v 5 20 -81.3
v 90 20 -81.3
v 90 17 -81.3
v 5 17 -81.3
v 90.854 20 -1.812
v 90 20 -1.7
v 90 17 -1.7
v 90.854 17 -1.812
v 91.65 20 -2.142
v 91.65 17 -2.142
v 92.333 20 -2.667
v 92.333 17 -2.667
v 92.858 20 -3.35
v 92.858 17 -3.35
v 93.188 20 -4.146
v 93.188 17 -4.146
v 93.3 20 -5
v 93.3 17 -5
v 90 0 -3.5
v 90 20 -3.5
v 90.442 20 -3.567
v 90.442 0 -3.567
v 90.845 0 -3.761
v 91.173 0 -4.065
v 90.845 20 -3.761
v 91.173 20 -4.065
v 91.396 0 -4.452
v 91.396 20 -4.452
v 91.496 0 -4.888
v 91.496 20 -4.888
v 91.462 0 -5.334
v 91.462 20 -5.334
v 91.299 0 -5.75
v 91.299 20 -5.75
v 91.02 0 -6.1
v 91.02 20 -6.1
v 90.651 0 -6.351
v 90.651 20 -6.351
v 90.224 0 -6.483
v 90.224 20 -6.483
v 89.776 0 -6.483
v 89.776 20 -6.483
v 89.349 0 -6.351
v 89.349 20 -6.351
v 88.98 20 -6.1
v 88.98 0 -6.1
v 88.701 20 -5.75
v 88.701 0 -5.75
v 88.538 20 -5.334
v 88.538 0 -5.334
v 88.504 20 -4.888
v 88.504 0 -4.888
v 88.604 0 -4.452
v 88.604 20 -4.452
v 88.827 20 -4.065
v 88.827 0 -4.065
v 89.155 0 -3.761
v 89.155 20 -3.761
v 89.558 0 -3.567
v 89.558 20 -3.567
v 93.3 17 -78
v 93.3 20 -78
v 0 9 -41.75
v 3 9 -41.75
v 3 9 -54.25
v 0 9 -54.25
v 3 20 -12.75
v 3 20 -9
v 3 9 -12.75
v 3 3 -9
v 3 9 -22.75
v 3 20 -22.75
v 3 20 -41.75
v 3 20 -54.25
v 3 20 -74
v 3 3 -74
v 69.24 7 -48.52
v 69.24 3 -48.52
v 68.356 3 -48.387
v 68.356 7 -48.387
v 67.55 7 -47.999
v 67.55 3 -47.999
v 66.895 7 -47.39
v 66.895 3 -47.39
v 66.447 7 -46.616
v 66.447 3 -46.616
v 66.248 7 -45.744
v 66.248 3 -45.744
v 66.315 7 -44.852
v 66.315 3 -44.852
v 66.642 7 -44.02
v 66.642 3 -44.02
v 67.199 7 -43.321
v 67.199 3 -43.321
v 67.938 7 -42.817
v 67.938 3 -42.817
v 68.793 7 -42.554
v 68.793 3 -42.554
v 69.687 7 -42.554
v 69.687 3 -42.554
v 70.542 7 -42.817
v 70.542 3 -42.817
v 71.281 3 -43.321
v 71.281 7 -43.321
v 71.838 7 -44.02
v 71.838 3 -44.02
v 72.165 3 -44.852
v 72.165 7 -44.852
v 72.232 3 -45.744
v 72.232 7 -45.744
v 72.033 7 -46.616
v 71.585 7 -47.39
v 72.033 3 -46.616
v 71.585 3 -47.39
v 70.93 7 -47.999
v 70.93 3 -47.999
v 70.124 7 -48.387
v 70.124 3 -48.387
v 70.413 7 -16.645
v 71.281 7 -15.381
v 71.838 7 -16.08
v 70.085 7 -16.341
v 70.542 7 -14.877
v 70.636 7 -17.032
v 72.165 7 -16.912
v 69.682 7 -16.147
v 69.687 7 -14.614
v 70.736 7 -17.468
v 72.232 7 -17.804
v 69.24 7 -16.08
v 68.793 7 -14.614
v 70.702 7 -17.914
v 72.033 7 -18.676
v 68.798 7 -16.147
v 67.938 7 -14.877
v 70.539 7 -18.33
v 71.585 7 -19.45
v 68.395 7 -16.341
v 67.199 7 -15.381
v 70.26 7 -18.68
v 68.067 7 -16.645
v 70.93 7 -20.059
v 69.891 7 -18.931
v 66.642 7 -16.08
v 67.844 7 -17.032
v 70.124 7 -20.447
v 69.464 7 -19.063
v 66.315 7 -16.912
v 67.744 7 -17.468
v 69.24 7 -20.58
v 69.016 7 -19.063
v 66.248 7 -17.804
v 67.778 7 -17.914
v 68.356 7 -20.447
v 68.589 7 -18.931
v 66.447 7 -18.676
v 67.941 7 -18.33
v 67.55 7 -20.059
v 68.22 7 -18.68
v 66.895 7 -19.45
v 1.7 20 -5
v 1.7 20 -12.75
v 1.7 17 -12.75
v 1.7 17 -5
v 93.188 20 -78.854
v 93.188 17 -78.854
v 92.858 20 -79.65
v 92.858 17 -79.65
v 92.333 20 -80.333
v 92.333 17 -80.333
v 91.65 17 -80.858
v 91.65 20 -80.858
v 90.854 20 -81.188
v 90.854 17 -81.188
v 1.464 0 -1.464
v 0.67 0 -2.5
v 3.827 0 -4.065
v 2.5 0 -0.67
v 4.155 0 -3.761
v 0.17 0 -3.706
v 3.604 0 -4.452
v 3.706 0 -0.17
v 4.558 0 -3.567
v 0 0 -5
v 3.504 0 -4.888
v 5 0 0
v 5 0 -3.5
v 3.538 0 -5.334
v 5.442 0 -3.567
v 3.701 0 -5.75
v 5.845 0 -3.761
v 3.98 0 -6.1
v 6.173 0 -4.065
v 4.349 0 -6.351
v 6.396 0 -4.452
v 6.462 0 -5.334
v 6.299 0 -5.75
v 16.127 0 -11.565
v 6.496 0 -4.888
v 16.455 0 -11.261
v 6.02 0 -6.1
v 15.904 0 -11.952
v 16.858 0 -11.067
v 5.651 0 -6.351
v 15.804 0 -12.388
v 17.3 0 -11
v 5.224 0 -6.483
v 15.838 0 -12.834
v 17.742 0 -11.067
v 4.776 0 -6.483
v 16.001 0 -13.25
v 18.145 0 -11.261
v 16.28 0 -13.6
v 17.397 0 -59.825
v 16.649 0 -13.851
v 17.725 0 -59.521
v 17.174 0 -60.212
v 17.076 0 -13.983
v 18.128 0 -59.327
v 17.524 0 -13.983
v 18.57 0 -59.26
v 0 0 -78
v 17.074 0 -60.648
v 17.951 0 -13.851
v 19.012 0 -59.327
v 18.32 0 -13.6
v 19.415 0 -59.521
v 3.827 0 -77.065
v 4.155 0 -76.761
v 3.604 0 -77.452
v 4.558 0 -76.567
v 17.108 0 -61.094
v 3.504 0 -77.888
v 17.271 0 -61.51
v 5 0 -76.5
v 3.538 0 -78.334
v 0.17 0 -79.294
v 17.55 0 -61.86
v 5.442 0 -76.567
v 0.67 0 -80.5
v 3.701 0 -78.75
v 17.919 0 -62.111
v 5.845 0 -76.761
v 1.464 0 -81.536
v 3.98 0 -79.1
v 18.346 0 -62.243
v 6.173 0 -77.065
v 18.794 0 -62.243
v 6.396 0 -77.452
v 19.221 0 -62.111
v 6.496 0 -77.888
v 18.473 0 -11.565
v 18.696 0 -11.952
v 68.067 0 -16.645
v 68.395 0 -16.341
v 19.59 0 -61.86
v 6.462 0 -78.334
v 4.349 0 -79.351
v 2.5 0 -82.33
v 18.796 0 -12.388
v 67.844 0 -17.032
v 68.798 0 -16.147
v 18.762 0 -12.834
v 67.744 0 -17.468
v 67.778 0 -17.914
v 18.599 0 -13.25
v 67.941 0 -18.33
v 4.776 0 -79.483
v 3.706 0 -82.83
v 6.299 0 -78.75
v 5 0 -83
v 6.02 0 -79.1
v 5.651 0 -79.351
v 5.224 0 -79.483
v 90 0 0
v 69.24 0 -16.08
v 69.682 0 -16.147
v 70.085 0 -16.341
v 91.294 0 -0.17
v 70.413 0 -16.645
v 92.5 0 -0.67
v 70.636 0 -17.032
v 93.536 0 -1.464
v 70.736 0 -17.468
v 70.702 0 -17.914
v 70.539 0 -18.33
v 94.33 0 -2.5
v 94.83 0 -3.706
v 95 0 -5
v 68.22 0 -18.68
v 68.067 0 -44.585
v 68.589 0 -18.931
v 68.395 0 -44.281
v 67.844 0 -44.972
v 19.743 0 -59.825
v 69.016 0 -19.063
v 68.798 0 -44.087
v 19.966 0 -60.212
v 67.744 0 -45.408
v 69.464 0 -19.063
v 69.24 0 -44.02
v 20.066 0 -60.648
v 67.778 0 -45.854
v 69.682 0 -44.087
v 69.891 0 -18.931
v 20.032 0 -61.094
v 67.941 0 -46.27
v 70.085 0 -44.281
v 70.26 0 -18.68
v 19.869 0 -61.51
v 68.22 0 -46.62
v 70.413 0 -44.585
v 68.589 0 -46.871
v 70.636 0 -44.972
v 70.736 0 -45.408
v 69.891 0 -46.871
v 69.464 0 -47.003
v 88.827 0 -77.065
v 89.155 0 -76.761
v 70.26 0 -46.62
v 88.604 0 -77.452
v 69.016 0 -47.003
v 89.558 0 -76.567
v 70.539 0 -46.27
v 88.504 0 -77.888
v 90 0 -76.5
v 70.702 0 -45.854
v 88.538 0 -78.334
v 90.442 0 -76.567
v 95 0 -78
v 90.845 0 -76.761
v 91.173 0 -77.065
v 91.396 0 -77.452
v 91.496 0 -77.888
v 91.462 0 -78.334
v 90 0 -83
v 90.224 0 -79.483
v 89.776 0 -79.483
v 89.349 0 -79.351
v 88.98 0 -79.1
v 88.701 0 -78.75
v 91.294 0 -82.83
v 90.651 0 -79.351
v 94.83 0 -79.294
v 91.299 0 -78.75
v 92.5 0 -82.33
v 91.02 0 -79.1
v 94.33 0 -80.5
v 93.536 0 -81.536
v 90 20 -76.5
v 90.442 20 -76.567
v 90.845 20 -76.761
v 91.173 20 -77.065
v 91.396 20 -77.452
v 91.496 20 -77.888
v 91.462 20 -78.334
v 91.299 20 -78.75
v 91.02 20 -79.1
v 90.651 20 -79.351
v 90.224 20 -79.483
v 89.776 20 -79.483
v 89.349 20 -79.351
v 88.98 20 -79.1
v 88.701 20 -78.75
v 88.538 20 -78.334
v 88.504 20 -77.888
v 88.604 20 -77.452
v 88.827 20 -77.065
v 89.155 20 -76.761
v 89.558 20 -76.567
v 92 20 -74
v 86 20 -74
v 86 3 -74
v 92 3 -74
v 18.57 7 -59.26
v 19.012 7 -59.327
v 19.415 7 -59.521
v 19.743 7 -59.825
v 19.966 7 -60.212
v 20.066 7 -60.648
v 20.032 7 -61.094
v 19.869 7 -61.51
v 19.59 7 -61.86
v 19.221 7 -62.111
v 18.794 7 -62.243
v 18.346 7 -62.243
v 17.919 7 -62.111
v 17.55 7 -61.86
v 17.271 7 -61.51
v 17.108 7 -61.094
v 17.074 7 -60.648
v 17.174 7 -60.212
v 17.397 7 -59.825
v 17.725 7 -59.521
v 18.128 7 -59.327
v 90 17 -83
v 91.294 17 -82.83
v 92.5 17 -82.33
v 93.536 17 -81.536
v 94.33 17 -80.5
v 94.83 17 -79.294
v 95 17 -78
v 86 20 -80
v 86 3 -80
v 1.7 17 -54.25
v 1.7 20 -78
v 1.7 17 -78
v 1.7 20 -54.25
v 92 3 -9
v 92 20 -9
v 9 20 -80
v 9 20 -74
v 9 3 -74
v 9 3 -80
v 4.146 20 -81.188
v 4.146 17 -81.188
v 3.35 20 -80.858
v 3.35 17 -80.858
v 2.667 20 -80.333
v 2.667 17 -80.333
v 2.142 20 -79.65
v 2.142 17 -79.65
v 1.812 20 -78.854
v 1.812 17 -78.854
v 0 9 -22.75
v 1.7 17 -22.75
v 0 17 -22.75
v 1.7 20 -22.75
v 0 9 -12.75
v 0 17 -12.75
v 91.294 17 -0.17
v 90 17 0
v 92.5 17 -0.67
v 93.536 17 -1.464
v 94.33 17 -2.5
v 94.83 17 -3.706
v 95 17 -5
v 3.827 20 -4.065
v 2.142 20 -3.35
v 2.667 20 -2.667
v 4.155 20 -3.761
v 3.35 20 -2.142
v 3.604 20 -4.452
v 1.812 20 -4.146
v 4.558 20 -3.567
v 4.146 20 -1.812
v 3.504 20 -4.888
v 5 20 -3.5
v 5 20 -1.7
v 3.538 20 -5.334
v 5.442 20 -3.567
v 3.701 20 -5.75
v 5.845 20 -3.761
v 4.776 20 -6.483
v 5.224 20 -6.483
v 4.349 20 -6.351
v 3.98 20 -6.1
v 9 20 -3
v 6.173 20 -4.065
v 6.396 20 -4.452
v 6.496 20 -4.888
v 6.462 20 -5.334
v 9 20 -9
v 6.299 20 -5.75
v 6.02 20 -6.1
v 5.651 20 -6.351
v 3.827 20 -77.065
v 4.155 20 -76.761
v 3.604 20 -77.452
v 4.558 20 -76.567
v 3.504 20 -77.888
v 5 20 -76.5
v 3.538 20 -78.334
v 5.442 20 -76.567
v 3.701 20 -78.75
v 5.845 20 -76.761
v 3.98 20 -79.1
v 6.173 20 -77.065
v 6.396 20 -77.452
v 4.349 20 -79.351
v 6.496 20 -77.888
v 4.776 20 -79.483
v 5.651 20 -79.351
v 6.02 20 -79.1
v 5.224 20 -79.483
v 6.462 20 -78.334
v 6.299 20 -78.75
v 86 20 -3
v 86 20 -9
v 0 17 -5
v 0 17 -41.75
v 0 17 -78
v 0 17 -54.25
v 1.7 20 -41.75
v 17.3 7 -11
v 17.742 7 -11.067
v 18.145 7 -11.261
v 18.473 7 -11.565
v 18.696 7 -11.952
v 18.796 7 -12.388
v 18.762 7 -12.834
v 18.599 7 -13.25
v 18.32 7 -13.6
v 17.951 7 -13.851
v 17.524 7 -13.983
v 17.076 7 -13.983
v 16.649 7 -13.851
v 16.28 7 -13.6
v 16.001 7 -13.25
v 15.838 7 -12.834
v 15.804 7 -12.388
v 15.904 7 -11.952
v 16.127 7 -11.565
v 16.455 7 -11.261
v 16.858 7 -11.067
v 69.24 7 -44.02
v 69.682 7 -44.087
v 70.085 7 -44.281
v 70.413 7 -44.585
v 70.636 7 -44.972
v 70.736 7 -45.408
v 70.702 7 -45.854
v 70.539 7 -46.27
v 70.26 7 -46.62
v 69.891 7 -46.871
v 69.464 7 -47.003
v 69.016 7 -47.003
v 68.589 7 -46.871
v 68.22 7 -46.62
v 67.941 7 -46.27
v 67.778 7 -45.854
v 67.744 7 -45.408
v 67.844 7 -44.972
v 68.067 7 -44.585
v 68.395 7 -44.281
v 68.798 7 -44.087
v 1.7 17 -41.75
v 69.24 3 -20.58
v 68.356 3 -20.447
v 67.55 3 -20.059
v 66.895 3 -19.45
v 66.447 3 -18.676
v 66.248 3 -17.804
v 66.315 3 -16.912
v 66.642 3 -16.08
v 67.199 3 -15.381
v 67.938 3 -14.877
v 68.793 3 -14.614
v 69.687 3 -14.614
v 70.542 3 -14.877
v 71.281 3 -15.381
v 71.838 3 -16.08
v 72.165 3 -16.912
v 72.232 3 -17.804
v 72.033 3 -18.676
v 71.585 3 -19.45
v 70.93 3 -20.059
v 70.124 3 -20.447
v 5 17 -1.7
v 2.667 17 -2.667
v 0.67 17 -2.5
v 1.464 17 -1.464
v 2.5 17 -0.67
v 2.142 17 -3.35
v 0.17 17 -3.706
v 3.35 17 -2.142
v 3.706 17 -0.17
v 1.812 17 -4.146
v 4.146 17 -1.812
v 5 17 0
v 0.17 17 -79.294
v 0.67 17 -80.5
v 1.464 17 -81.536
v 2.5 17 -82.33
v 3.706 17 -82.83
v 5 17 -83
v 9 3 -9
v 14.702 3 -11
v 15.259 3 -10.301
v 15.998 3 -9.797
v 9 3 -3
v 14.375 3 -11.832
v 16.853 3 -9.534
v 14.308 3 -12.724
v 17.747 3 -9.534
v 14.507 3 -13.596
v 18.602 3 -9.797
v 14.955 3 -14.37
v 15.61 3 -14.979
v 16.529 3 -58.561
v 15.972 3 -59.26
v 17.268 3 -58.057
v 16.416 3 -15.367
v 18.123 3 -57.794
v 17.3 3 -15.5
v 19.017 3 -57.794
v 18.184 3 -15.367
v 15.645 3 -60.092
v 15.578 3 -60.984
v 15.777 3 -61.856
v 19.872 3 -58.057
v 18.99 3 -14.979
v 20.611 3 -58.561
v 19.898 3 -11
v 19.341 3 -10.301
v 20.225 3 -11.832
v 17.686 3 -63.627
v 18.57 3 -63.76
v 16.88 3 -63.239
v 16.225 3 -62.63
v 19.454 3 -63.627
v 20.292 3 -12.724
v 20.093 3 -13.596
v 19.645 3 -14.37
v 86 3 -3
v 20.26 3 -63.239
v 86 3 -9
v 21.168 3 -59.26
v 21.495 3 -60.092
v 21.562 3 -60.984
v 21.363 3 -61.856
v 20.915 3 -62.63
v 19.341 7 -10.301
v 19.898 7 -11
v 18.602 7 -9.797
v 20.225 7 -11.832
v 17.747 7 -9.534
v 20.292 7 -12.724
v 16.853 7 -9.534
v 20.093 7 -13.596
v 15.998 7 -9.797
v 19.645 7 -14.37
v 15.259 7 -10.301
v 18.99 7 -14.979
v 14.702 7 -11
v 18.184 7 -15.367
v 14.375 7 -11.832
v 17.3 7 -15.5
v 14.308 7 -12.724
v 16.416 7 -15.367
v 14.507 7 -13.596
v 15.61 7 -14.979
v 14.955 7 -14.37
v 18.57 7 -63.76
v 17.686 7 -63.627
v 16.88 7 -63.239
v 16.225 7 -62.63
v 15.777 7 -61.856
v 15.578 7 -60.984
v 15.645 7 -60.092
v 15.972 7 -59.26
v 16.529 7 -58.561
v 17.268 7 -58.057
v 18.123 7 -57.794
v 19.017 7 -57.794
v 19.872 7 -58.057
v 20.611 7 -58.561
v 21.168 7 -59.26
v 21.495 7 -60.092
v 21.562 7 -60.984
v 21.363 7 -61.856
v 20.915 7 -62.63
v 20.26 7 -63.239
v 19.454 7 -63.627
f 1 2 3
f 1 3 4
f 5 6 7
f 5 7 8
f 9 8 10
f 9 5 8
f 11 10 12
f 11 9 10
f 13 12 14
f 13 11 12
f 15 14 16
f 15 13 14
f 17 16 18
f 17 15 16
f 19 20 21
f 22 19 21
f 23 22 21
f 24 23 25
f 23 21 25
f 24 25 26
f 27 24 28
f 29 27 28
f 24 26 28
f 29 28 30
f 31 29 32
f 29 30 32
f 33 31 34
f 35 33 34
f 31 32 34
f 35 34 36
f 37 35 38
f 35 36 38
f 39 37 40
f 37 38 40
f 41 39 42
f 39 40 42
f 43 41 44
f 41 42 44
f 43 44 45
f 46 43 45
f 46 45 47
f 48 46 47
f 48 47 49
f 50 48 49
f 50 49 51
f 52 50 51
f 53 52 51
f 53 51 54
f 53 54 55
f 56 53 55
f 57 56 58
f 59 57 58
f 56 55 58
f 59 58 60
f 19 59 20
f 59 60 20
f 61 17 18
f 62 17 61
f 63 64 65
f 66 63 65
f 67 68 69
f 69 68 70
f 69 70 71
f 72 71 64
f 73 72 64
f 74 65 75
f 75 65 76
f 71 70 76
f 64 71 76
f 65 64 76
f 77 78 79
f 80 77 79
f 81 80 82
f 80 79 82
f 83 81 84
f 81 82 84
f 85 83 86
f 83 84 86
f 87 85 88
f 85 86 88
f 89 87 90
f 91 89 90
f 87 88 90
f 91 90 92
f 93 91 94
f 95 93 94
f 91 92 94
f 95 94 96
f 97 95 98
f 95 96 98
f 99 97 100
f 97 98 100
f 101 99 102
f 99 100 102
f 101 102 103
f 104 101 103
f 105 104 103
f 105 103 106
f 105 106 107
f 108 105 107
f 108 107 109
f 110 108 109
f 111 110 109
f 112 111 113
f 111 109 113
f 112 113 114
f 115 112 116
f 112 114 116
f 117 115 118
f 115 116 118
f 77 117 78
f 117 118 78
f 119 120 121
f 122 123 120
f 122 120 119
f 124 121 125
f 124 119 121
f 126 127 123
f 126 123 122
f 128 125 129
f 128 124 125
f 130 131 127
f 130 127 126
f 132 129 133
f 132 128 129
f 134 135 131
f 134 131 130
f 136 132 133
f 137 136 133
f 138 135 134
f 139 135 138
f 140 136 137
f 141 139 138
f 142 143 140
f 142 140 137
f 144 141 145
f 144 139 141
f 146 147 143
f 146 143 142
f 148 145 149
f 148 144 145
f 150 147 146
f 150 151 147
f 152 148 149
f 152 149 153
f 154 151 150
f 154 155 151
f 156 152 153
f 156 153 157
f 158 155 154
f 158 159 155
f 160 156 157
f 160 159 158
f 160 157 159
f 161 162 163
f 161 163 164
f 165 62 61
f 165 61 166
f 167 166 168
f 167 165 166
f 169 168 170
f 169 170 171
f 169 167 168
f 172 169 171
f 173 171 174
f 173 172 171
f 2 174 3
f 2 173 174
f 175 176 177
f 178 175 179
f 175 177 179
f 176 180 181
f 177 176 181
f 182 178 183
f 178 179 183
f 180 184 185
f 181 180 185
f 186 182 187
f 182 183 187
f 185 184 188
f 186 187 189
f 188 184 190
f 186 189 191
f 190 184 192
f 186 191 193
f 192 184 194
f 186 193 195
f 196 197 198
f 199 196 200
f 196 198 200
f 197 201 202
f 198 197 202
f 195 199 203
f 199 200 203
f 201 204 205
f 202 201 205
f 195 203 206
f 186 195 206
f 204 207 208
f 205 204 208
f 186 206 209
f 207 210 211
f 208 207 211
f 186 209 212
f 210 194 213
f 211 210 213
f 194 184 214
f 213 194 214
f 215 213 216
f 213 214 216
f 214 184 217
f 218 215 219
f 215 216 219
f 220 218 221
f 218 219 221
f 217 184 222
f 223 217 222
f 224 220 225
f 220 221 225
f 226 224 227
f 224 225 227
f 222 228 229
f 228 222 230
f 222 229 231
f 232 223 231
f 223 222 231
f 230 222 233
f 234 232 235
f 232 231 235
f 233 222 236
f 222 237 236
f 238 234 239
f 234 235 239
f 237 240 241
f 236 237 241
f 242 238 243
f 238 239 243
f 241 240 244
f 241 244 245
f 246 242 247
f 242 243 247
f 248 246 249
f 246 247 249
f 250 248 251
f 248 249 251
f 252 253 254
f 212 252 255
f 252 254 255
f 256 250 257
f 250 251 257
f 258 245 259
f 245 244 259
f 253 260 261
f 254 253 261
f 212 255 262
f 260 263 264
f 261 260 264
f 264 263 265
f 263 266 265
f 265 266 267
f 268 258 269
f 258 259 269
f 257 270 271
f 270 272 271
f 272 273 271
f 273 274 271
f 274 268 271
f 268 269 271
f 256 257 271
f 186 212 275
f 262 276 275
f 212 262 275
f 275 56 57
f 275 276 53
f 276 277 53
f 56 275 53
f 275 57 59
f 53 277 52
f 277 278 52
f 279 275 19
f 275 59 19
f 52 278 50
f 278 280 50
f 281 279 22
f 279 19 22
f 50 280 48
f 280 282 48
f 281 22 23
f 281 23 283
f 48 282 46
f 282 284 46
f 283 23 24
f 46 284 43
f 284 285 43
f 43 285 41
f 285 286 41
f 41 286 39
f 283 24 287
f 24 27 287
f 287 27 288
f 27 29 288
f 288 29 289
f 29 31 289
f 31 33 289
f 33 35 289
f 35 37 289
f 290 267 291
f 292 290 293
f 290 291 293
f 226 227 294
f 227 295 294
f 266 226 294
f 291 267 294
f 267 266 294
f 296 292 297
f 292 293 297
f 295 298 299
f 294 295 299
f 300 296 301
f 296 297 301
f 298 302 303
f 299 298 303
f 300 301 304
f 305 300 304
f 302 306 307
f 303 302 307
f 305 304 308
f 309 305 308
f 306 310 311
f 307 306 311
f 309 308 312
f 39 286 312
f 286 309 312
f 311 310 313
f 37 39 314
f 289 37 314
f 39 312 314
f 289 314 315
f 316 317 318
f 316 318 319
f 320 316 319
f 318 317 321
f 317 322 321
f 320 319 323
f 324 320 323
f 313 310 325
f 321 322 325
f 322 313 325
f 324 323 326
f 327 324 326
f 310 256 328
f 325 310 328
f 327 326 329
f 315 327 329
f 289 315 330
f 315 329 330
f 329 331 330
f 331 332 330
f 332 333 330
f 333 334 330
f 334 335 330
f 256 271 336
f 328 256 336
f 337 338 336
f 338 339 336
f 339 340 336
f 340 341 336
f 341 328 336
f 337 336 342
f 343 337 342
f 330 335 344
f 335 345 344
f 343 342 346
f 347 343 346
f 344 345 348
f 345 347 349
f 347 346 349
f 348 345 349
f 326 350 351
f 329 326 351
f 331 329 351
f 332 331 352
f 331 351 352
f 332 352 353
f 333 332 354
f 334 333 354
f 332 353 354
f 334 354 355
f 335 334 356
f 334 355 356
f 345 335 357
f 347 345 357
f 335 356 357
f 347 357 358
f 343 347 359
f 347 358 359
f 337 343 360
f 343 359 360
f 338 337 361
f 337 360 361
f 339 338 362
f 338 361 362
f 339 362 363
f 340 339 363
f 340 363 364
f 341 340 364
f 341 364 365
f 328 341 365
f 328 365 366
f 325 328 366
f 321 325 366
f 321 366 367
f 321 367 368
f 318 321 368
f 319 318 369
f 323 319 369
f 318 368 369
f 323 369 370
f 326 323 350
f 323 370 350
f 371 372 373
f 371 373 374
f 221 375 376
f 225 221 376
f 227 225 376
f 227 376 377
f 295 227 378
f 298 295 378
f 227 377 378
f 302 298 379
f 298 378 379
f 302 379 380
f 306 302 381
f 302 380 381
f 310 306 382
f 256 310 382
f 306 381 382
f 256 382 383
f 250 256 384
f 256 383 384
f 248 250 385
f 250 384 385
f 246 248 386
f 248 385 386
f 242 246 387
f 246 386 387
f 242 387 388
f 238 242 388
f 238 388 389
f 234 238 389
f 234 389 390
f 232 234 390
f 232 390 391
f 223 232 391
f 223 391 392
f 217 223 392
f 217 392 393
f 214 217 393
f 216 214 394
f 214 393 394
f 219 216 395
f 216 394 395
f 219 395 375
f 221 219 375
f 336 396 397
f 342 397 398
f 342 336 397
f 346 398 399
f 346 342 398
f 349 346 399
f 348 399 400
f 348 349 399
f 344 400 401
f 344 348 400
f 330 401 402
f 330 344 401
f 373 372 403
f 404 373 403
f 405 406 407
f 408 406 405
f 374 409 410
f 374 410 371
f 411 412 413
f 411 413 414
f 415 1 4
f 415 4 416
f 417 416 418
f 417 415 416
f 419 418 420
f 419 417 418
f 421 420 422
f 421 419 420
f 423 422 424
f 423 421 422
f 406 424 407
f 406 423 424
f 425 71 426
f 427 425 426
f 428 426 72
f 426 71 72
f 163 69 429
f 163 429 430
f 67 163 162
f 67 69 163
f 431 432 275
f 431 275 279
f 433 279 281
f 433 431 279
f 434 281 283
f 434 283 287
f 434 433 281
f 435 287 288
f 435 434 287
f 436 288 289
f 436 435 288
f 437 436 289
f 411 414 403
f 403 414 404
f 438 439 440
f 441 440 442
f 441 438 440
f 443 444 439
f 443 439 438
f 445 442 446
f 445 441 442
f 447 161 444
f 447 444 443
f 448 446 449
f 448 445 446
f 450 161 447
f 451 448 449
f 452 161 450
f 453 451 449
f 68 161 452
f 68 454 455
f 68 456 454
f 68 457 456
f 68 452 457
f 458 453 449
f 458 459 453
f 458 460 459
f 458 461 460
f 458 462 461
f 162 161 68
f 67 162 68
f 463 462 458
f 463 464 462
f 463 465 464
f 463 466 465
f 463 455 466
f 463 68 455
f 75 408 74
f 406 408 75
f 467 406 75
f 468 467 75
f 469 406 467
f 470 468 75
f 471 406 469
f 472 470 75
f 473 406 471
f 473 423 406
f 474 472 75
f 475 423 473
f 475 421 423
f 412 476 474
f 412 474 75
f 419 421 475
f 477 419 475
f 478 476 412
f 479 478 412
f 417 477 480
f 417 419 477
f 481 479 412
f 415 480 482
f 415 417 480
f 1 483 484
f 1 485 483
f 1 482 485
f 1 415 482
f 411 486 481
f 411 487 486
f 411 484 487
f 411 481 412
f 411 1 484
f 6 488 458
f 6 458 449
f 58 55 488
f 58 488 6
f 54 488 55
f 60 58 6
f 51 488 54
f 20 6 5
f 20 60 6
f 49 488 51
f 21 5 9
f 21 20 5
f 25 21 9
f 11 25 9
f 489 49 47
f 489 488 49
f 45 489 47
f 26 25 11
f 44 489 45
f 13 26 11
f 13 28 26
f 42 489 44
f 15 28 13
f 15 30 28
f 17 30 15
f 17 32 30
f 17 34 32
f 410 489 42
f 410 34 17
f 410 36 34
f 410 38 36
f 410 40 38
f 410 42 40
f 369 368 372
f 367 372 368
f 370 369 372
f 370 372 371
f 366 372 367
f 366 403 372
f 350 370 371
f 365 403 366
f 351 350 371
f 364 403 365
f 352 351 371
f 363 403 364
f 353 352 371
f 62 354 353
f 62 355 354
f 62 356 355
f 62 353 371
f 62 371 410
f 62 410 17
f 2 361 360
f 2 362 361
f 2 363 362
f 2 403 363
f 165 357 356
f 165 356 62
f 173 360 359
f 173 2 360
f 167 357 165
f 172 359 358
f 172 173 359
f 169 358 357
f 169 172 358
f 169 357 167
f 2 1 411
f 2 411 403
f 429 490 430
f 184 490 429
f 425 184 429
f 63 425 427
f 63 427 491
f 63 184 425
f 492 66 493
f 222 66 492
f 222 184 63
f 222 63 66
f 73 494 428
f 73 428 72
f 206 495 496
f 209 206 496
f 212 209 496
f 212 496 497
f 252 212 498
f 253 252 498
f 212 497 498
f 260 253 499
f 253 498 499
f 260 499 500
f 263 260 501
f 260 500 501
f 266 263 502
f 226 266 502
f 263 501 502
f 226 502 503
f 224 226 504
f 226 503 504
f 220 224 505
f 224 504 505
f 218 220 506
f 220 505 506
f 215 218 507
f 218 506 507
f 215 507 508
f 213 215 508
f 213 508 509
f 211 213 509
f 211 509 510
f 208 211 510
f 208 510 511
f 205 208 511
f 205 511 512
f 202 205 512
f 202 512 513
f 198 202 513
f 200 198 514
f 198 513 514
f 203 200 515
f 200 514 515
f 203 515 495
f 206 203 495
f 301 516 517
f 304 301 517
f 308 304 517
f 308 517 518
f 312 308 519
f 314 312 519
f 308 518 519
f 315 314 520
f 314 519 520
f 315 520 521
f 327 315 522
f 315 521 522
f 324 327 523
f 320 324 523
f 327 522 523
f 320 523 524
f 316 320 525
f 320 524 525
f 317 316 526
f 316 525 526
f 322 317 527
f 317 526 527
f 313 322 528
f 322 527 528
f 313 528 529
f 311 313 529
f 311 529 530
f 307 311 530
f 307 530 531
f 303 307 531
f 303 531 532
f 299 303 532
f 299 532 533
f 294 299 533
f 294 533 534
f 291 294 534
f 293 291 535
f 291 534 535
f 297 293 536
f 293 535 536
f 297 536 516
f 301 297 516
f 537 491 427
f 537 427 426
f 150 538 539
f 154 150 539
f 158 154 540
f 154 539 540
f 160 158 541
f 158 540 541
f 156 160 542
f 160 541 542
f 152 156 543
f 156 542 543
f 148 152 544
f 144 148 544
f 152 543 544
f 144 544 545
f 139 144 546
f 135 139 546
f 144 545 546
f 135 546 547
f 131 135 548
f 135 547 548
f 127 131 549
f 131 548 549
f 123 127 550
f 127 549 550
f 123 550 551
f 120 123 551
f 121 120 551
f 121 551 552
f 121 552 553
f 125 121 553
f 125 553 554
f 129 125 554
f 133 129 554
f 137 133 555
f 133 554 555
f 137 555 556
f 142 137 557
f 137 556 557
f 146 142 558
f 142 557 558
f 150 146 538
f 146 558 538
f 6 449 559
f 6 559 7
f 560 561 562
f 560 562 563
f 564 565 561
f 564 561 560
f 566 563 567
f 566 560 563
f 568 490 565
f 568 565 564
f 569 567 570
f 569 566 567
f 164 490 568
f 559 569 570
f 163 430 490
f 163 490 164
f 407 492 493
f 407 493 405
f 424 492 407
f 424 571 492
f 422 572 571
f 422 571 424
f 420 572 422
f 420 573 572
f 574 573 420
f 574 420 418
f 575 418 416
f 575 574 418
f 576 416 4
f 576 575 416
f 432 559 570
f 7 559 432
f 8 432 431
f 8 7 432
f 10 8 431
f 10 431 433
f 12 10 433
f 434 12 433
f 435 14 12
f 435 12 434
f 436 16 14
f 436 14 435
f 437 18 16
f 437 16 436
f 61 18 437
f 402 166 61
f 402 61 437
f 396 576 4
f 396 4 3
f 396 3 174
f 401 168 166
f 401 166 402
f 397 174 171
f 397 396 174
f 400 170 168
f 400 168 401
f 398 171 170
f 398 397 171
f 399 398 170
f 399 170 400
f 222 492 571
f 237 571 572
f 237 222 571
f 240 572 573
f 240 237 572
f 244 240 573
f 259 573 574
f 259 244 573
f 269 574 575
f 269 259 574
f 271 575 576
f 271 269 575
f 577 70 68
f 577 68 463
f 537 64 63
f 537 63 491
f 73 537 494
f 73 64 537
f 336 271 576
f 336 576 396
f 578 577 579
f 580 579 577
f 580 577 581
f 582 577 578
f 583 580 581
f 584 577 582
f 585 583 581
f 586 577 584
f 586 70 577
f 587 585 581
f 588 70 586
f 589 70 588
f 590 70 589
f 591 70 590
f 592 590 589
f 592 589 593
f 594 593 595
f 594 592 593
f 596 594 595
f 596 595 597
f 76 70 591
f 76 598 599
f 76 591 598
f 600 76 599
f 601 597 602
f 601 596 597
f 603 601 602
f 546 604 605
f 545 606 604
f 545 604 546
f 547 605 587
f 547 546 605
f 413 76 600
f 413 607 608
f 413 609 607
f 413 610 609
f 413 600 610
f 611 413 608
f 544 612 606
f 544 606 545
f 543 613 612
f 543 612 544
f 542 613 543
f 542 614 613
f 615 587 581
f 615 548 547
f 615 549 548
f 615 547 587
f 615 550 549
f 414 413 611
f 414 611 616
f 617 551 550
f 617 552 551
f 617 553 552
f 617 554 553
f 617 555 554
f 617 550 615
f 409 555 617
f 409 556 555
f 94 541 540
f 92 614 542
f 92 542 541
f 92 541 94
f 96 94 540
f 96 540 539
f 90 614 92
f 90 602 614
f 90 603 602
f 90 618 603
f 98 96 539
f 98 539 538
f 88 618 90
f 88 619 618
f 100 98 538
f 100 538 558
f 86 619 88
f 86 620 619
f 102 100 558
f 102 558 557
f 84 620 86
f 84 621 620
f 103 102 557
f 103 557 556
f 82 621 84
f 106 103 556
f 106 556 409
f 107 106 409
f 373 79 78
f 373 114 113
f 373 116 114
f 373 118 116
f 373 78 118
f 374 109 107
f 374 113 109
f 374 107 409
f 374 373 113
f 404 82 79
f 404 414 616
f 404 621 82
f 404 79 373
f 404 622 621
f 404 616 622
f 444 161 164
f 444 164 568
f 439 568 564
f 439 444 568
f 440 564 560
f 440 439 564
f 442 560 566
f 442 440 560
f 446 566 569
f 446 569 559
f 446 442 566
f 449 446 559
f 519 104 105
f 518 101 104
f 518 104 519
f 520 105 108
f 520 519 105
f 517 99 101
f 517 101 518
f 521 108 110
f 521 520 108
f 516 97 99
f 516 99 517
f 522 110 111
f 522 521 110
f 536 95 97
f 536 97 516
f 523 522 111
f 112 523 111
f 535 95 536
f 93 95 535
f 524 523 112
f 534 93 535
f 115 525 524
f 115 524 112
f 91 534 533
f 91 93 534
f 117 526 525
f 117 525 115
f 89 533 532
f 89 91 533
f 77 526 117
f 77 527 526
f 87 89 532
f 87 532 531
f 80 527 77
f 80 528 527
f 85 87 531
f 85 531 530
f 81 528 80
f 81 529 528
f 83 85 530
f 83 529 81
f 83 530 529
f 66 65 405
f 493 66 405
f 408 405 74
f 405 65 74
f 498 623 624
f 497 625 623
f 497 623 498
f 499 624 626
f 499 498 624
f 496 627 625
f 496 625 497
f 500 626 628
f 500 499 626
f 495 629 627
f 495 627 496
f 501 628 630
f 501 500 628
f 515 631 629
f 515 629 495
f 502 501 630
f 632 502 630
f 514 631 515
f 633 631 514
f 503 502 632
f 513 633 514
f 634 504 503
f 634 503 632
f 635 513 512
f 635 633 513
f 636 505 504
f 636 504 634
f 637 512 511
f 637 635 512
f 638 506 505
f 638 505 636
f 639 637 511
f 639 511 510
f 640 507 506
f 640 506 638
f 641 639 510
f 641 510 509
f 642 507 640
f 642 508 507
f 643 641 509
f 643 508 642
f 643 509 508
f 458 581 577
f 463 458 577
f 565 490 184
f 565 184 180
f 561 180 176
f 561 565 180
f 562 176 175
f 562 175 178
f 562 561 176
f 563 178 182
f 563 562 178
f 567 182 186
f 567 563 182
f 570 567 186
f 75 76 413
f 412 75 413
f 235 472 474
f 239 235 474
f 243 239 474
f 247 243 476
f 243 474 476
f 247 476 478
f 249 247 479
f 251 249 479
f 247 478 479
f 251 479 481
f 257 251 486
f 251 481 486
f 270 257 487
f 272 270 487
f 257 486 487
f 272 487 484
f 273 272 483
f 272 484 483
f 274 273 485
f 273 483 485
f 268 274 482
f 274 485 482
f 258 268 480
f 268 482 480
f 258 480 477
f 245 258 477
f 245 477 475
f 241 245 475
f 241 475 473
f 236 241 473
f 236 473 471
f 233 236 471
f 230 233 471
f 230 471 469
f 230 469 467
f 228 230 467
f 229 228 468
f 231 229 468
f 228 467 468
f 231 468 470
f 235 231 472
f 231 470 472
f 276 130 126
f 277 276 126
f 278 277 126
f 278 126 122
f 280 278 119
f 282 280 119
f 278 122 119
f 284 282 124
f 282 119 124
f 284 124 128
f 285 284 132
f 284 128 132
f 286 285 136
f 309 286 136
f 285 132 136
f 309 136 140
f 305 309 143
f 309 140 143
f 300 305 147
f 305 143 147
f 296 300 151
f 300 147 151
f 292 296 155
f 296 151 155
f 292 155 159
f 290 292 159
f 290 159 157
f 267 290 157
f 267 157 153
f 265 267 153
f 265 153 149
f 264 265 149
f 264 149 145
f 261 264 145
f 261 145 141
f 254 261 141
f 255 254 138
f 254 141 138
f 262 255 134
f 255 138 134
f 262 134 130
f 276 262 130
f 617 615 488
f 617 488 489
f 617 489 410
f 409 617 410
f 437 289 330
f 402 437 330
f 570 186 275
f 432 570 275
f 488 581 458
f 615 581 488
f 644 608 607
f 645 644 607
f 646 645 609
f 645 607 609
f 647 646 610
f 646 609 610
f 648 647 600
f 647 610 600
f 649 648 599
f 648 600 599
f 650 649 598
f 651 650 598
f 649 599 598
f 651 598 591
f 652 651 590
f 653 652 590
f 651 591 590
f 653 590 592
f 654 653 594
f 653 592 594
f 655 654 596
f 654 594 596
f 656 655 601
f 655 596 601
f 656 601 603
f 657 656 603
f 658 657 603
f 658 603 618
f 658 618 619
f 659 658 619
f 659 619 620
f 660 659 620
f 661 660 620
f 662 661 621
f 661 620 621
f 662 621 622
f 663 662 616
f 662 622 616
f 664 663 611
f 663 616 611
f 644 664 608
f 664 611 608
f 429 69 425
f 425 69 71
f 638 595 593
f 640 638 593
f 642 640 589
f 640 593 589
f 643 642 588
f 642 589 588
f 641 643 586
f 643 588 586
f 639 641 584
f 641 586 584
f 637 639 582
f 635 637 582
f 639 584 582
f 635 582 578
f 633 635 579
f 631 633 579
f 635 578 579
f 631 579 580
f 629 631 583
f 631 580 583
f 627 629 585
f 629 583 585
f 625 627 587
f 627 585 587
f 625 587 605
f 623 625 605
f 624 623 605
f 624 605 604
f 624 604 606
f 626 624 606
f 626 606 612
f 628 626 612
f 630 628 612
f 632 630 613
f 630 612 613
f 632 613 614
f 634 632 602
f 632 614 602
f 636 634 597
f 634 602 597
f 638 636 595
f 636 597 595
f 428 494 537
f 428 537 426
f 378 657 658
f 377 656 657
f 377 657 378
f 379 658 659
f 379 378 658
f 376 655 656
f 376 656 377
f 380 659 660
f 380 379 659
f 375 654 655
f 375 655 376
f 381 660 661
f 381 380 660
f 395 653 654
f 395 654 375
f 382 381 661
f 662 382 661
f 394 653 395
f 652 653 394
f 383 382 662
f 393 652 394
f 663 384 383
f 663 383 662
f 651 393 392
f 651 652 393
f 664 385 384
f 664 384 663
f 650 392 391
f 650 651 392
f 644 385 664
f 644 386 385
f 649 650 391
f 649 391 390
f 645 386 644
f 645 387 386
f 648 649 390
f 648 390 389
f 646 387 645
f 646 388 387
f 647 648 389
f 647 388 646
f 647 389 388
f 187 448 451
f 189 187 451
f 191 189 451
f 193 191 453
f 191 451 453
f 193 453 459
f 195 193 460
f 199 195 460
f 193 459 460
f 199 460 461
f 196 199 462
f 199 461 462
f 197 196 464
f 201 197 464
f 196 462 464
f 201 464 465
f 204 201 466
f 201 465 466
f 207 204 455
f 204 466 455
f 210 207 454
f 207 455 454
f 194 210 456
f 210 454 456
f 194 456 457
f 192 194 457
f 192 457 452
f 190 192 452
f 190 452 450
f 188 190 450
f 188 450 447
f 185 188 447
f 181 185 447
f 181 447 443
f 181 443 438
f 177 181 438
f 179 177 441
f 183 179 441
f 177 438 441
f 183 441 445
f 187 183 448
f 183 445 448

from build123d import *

# Parameters (mm, degrees)
SKETCH1_W           = 95
SKETCH1_H           = 83
BOSS_EXTRUDE1_DEPTH = 3
SKETCH2_W           = 95
SKETCH2_H           = 83
SKETCH2_W_2         = 89
SKETCH2_H_2         = 77
BOSS_EXTRUDE2_DEPTH = 17
SKETCH4_R           = 3
BOSS_EXTRUDE3_DEPTH = 4
SKETCH5_R           = 1.5
CUT_EXTRUDE2_DEPTH  = 7
SKETCH6_W           = 6
SKETCH6_H           = 6
BOSS_EXTRUDE4_DEPTH = 17
SKETCH7_R           = 1.5
CUT_EXTRUDE3_DEPTH  = 20
FILLET4_R           = 5
CUT_EXTRUDE4_DEPTH  = 3
CUT_EXTRUDE1_REACH  = 127.511
SKETCH3_W           = 10
SKETCH3_H           = 11
SKETCH3_W_2         = 12.5


with BuildPart() as part:
    # Sketch1 → Boss-Extrude1 (new body)
    with BuildSketch(Plane(origin=(0, 0, 0), x_dir=(1, 0, 0), z_dir=(0, 1, 0))):
        with Locations((47.5, 41.5)):
            Rectangle(SKETCH1_W, SKETCH1_H)
    extrude(amount=BOSS_EXTRUDE1_DEPTH)

    # Sketch2 → Boss-Extrude2 (add)
    with BuildSketch(Plane(origin=(0, 3, 0), x_dir=(1, 0, 0), z_dir=(0, 1, 0))):
        with Locations((47.5, 41.5)):
            Rectangle(SKETCH2_W, SKETCH2_H)
        with Locations((47.5, 41.5)):
            Rectangle(SKETCH2_W_2, SKETCH2_H_2, mode=Mode.SUBTRACT)
    extrude(amount=BOSS_EXTRUDE2_DEPTH)

    # Sketch4 → Boss-Extrude3 (add)
    with BuildSketch(Plane(origin=(0, 3, 0), x_dir=(1, 0, 0), z_dir=(0, 1, 0))):
        with Locations(Location((17.3, 12.5, 0), (0, 0, 90))):
            Circle(SKETCH4_R)
        with Locations(Location((18.57, 60.76, 0), (0, 0, 90))):
            Circle(SKETCH4_R)
        with Locations(Location((69.24, 45.52, 0), (0, 0, 90))):
            Circle(SKETCH4_R)
        with Locations(Location((69.24, 17.58, 0), (0, 0, 90))):
            Circle(SKETCH4_R)
    extrude(amount=BOSS_EXTRUDE3_DEPTH)

    # Sketch5 → Cut-Extrude2 (cut)
    with BuildSketch(Plane(origin=(0, 7, 0), x_dir=(1, 0, 0), z_dir=(0, 1, 0))):
        with Locations(Location((18.57, 60.76, 0), (0, 0, 270))):
            Circle(SKETCH5_R)
        with Locations(Location((69.24, 45.52, 0), (0, 0, 270))):
            Circle(SKETCH5_R)
        with Locations(Location((69.24, 17.58, 0), (0, 0, 270))):
            Circle(SKETCH5_R)
        with Locations(Location((17.3, 12.5, 0), (0, 0, 270))):
            Circle(SKETCH5_R)
    extrude(amount=-CUT_EXTRUDE2_DEPTH, mode=Mode.SUBTRACT)

    # Sketch6 → Boss-Extrude4 (add)
    with BuildSketch(Plane(origin=(0, 3, 0), x_dir=(1, 0, 0), z_dir=(0, 1, 0))):
        with Locations((6, 6)):
            Rectangle(SKETCH6_W, SKETCH6_H)
        with Locations((89, 6)):
            Rectangle(SKETCH6_W, SKETCH6_H)
        with Locations((89, 77)):
            Rectangle(SKETCH6_W, SKETCH6_H)
        with Locations((6, 77)):
            Rectangle(SKETCH6_W, SKETCH6_H)
    extrude(amount=BOSS_EXTRUDE4_DEPTH)

    # Sketch7 → Cut-Extrude3 (cut)
    with BuildSketch(Plane(origin=(0, 20, 0), x_dir=(1, 0, 0), z_dir=(0, 1, 0))):
        with Locations(Location((5, 5, 0), (0, 0, 270))):
            Circle(SKETCH7_R)
        with Locations(Location((90, 5, 0), (0, 0, 270))):
            Circle(SKETCH7_R)
        with Locations(Location((90, 78, 0), (0, 0, 270))):
            Circle(SKETCH7_R)
        with Locations(Location((5, 78, 0), (0, 0, 270))):
            Circle(SKETCH7_R)
    extrude(amount=-CUT_EXTRUDE3_DEPTH, mode=Mode.SUBTRACT)

    # Fillet4
    fillet4_edges = [part.edges().sort_by_distance(p)[0] for p in [
        (0, 10, -83),
        (95, 10, -83),
        (95, 10, 0),
        (0, 10, 0),
    ]]
    fillet(fillet4_edges, radius=FILLET4_R)

    # Sketch9 → Cut-Extrude4 (cut)
    with BuildSketch(Plane(origin=(0, 20, 0), x_dir=(1, 0, 0), z_dir=(0, 1, 0))):
        with BuildLine():
            Line((95, 5), (95, 78))
            ThreePointArc((95, 78), (93.535533906, 81.535533906), (90, 83))
            Line((90, 83), (5, 83))
            ThreePointArc((5, 83), (1.464466094, 81.535533906), (0, 78))
            Line((0, 78), (0, 5))
            ThreePointArc((0, 5), (1.464466094, 1.464466094), (5, 0))
            Line((5, 0), (90, 0))
            ThreePointArc((90, 0), (93.535533906, 1.464466094), (95, 5))
        make_face()
        with BuildLine():
            Line((93.3, 5), (93.3, 78))
            ThreePointArc((93.3, 78), (92.333452378, 80.333452378), (90, 81.3))
            Line((90, 81.3), (5, 81.3))
            ThreePointArc((5, 81.3), (2.666547622, 80.333452378), (1.7, 78))
            Line((1.7, 78), (1.7, 5))
            ThreePointArc((1.7, 5), (2.666547622, 2.666547622), (5, 1.7))
            Line((5, 1.7), (90, 1.7))
            ThreePointArc((90, 1.7), (92.333452378, 2.666547622), (93.3, 5))
        make_face(mode=Mode.SUBTRACT)
    extrude(amount=-CUT_EXTRUDE4_DEPTH, mode=Mode.SUBTRACT)

    # Cut-Extrude1: up to this face of the body (flat: up to its plane)
    cut_extrude1_end = Plane(part.part.faces().sort_by_distance((0, 8.5, -41.5))[0])
    # Sketch3 → Cut-Extrude1 (cut, up to the picked face)
    with BuildSketch(Plane(origin=(3, 0, 0), x_dir=(0, 0, -1), z_dir=(1, 0, 0)), mode=Mode.PRIVATE) as cut_extrude1_sk1:
        with Locations((17.75, 14.5)):
            Rectangle(SKETCH3_W, SKETCH3_H)
    cut_extrude1_tool1 = split(extrude(cut_extrude1_sk1.sketch, amount=-CUT_EXTRUDE1_REACH, mode=Mode.PRIVATE), bisect_by=cut_extrude1_end, keep=Keep.BOTH, mode=Mode.PRIVATE)
    # Sketch3 → Cut-Extrude1 (cut, up to the picked face)
    with BuildSketch(Plane(origin=(3, 0, 0), x_dir=(0, 0, -1), z_dir=(1, 0, 0)), mode=Mode.PRIVATE) as cut_extrude1_sk2:
        with Locations((48, 14.5)):
            Rectangle(SKETCH3_W_2, SKETCH3_H)
    cut_extrude1_tool2 = split(extrude(cut_extrude1_sk2.sketch, amount=-CUT_EXTRUDE1_REACH, mode=Mode.PRIVATE), bisect_by=cut_extrude1_end, keep=Keep.BOTH, mode=Mode.PRIVATE)
    add(cut_extrude1_tool1.solids().sort_by(Axis((3, 14.5, -17.75), (-1, 0, 0)))[0], mode=Mode.SUBTRACT)
    add(cut_extrude1_tool2.solids().sort_by(Axis((3, 14.5, -48), (-1, 0, 0)))[0], mode=Mode.SUBTRACT)


solid = part.part
